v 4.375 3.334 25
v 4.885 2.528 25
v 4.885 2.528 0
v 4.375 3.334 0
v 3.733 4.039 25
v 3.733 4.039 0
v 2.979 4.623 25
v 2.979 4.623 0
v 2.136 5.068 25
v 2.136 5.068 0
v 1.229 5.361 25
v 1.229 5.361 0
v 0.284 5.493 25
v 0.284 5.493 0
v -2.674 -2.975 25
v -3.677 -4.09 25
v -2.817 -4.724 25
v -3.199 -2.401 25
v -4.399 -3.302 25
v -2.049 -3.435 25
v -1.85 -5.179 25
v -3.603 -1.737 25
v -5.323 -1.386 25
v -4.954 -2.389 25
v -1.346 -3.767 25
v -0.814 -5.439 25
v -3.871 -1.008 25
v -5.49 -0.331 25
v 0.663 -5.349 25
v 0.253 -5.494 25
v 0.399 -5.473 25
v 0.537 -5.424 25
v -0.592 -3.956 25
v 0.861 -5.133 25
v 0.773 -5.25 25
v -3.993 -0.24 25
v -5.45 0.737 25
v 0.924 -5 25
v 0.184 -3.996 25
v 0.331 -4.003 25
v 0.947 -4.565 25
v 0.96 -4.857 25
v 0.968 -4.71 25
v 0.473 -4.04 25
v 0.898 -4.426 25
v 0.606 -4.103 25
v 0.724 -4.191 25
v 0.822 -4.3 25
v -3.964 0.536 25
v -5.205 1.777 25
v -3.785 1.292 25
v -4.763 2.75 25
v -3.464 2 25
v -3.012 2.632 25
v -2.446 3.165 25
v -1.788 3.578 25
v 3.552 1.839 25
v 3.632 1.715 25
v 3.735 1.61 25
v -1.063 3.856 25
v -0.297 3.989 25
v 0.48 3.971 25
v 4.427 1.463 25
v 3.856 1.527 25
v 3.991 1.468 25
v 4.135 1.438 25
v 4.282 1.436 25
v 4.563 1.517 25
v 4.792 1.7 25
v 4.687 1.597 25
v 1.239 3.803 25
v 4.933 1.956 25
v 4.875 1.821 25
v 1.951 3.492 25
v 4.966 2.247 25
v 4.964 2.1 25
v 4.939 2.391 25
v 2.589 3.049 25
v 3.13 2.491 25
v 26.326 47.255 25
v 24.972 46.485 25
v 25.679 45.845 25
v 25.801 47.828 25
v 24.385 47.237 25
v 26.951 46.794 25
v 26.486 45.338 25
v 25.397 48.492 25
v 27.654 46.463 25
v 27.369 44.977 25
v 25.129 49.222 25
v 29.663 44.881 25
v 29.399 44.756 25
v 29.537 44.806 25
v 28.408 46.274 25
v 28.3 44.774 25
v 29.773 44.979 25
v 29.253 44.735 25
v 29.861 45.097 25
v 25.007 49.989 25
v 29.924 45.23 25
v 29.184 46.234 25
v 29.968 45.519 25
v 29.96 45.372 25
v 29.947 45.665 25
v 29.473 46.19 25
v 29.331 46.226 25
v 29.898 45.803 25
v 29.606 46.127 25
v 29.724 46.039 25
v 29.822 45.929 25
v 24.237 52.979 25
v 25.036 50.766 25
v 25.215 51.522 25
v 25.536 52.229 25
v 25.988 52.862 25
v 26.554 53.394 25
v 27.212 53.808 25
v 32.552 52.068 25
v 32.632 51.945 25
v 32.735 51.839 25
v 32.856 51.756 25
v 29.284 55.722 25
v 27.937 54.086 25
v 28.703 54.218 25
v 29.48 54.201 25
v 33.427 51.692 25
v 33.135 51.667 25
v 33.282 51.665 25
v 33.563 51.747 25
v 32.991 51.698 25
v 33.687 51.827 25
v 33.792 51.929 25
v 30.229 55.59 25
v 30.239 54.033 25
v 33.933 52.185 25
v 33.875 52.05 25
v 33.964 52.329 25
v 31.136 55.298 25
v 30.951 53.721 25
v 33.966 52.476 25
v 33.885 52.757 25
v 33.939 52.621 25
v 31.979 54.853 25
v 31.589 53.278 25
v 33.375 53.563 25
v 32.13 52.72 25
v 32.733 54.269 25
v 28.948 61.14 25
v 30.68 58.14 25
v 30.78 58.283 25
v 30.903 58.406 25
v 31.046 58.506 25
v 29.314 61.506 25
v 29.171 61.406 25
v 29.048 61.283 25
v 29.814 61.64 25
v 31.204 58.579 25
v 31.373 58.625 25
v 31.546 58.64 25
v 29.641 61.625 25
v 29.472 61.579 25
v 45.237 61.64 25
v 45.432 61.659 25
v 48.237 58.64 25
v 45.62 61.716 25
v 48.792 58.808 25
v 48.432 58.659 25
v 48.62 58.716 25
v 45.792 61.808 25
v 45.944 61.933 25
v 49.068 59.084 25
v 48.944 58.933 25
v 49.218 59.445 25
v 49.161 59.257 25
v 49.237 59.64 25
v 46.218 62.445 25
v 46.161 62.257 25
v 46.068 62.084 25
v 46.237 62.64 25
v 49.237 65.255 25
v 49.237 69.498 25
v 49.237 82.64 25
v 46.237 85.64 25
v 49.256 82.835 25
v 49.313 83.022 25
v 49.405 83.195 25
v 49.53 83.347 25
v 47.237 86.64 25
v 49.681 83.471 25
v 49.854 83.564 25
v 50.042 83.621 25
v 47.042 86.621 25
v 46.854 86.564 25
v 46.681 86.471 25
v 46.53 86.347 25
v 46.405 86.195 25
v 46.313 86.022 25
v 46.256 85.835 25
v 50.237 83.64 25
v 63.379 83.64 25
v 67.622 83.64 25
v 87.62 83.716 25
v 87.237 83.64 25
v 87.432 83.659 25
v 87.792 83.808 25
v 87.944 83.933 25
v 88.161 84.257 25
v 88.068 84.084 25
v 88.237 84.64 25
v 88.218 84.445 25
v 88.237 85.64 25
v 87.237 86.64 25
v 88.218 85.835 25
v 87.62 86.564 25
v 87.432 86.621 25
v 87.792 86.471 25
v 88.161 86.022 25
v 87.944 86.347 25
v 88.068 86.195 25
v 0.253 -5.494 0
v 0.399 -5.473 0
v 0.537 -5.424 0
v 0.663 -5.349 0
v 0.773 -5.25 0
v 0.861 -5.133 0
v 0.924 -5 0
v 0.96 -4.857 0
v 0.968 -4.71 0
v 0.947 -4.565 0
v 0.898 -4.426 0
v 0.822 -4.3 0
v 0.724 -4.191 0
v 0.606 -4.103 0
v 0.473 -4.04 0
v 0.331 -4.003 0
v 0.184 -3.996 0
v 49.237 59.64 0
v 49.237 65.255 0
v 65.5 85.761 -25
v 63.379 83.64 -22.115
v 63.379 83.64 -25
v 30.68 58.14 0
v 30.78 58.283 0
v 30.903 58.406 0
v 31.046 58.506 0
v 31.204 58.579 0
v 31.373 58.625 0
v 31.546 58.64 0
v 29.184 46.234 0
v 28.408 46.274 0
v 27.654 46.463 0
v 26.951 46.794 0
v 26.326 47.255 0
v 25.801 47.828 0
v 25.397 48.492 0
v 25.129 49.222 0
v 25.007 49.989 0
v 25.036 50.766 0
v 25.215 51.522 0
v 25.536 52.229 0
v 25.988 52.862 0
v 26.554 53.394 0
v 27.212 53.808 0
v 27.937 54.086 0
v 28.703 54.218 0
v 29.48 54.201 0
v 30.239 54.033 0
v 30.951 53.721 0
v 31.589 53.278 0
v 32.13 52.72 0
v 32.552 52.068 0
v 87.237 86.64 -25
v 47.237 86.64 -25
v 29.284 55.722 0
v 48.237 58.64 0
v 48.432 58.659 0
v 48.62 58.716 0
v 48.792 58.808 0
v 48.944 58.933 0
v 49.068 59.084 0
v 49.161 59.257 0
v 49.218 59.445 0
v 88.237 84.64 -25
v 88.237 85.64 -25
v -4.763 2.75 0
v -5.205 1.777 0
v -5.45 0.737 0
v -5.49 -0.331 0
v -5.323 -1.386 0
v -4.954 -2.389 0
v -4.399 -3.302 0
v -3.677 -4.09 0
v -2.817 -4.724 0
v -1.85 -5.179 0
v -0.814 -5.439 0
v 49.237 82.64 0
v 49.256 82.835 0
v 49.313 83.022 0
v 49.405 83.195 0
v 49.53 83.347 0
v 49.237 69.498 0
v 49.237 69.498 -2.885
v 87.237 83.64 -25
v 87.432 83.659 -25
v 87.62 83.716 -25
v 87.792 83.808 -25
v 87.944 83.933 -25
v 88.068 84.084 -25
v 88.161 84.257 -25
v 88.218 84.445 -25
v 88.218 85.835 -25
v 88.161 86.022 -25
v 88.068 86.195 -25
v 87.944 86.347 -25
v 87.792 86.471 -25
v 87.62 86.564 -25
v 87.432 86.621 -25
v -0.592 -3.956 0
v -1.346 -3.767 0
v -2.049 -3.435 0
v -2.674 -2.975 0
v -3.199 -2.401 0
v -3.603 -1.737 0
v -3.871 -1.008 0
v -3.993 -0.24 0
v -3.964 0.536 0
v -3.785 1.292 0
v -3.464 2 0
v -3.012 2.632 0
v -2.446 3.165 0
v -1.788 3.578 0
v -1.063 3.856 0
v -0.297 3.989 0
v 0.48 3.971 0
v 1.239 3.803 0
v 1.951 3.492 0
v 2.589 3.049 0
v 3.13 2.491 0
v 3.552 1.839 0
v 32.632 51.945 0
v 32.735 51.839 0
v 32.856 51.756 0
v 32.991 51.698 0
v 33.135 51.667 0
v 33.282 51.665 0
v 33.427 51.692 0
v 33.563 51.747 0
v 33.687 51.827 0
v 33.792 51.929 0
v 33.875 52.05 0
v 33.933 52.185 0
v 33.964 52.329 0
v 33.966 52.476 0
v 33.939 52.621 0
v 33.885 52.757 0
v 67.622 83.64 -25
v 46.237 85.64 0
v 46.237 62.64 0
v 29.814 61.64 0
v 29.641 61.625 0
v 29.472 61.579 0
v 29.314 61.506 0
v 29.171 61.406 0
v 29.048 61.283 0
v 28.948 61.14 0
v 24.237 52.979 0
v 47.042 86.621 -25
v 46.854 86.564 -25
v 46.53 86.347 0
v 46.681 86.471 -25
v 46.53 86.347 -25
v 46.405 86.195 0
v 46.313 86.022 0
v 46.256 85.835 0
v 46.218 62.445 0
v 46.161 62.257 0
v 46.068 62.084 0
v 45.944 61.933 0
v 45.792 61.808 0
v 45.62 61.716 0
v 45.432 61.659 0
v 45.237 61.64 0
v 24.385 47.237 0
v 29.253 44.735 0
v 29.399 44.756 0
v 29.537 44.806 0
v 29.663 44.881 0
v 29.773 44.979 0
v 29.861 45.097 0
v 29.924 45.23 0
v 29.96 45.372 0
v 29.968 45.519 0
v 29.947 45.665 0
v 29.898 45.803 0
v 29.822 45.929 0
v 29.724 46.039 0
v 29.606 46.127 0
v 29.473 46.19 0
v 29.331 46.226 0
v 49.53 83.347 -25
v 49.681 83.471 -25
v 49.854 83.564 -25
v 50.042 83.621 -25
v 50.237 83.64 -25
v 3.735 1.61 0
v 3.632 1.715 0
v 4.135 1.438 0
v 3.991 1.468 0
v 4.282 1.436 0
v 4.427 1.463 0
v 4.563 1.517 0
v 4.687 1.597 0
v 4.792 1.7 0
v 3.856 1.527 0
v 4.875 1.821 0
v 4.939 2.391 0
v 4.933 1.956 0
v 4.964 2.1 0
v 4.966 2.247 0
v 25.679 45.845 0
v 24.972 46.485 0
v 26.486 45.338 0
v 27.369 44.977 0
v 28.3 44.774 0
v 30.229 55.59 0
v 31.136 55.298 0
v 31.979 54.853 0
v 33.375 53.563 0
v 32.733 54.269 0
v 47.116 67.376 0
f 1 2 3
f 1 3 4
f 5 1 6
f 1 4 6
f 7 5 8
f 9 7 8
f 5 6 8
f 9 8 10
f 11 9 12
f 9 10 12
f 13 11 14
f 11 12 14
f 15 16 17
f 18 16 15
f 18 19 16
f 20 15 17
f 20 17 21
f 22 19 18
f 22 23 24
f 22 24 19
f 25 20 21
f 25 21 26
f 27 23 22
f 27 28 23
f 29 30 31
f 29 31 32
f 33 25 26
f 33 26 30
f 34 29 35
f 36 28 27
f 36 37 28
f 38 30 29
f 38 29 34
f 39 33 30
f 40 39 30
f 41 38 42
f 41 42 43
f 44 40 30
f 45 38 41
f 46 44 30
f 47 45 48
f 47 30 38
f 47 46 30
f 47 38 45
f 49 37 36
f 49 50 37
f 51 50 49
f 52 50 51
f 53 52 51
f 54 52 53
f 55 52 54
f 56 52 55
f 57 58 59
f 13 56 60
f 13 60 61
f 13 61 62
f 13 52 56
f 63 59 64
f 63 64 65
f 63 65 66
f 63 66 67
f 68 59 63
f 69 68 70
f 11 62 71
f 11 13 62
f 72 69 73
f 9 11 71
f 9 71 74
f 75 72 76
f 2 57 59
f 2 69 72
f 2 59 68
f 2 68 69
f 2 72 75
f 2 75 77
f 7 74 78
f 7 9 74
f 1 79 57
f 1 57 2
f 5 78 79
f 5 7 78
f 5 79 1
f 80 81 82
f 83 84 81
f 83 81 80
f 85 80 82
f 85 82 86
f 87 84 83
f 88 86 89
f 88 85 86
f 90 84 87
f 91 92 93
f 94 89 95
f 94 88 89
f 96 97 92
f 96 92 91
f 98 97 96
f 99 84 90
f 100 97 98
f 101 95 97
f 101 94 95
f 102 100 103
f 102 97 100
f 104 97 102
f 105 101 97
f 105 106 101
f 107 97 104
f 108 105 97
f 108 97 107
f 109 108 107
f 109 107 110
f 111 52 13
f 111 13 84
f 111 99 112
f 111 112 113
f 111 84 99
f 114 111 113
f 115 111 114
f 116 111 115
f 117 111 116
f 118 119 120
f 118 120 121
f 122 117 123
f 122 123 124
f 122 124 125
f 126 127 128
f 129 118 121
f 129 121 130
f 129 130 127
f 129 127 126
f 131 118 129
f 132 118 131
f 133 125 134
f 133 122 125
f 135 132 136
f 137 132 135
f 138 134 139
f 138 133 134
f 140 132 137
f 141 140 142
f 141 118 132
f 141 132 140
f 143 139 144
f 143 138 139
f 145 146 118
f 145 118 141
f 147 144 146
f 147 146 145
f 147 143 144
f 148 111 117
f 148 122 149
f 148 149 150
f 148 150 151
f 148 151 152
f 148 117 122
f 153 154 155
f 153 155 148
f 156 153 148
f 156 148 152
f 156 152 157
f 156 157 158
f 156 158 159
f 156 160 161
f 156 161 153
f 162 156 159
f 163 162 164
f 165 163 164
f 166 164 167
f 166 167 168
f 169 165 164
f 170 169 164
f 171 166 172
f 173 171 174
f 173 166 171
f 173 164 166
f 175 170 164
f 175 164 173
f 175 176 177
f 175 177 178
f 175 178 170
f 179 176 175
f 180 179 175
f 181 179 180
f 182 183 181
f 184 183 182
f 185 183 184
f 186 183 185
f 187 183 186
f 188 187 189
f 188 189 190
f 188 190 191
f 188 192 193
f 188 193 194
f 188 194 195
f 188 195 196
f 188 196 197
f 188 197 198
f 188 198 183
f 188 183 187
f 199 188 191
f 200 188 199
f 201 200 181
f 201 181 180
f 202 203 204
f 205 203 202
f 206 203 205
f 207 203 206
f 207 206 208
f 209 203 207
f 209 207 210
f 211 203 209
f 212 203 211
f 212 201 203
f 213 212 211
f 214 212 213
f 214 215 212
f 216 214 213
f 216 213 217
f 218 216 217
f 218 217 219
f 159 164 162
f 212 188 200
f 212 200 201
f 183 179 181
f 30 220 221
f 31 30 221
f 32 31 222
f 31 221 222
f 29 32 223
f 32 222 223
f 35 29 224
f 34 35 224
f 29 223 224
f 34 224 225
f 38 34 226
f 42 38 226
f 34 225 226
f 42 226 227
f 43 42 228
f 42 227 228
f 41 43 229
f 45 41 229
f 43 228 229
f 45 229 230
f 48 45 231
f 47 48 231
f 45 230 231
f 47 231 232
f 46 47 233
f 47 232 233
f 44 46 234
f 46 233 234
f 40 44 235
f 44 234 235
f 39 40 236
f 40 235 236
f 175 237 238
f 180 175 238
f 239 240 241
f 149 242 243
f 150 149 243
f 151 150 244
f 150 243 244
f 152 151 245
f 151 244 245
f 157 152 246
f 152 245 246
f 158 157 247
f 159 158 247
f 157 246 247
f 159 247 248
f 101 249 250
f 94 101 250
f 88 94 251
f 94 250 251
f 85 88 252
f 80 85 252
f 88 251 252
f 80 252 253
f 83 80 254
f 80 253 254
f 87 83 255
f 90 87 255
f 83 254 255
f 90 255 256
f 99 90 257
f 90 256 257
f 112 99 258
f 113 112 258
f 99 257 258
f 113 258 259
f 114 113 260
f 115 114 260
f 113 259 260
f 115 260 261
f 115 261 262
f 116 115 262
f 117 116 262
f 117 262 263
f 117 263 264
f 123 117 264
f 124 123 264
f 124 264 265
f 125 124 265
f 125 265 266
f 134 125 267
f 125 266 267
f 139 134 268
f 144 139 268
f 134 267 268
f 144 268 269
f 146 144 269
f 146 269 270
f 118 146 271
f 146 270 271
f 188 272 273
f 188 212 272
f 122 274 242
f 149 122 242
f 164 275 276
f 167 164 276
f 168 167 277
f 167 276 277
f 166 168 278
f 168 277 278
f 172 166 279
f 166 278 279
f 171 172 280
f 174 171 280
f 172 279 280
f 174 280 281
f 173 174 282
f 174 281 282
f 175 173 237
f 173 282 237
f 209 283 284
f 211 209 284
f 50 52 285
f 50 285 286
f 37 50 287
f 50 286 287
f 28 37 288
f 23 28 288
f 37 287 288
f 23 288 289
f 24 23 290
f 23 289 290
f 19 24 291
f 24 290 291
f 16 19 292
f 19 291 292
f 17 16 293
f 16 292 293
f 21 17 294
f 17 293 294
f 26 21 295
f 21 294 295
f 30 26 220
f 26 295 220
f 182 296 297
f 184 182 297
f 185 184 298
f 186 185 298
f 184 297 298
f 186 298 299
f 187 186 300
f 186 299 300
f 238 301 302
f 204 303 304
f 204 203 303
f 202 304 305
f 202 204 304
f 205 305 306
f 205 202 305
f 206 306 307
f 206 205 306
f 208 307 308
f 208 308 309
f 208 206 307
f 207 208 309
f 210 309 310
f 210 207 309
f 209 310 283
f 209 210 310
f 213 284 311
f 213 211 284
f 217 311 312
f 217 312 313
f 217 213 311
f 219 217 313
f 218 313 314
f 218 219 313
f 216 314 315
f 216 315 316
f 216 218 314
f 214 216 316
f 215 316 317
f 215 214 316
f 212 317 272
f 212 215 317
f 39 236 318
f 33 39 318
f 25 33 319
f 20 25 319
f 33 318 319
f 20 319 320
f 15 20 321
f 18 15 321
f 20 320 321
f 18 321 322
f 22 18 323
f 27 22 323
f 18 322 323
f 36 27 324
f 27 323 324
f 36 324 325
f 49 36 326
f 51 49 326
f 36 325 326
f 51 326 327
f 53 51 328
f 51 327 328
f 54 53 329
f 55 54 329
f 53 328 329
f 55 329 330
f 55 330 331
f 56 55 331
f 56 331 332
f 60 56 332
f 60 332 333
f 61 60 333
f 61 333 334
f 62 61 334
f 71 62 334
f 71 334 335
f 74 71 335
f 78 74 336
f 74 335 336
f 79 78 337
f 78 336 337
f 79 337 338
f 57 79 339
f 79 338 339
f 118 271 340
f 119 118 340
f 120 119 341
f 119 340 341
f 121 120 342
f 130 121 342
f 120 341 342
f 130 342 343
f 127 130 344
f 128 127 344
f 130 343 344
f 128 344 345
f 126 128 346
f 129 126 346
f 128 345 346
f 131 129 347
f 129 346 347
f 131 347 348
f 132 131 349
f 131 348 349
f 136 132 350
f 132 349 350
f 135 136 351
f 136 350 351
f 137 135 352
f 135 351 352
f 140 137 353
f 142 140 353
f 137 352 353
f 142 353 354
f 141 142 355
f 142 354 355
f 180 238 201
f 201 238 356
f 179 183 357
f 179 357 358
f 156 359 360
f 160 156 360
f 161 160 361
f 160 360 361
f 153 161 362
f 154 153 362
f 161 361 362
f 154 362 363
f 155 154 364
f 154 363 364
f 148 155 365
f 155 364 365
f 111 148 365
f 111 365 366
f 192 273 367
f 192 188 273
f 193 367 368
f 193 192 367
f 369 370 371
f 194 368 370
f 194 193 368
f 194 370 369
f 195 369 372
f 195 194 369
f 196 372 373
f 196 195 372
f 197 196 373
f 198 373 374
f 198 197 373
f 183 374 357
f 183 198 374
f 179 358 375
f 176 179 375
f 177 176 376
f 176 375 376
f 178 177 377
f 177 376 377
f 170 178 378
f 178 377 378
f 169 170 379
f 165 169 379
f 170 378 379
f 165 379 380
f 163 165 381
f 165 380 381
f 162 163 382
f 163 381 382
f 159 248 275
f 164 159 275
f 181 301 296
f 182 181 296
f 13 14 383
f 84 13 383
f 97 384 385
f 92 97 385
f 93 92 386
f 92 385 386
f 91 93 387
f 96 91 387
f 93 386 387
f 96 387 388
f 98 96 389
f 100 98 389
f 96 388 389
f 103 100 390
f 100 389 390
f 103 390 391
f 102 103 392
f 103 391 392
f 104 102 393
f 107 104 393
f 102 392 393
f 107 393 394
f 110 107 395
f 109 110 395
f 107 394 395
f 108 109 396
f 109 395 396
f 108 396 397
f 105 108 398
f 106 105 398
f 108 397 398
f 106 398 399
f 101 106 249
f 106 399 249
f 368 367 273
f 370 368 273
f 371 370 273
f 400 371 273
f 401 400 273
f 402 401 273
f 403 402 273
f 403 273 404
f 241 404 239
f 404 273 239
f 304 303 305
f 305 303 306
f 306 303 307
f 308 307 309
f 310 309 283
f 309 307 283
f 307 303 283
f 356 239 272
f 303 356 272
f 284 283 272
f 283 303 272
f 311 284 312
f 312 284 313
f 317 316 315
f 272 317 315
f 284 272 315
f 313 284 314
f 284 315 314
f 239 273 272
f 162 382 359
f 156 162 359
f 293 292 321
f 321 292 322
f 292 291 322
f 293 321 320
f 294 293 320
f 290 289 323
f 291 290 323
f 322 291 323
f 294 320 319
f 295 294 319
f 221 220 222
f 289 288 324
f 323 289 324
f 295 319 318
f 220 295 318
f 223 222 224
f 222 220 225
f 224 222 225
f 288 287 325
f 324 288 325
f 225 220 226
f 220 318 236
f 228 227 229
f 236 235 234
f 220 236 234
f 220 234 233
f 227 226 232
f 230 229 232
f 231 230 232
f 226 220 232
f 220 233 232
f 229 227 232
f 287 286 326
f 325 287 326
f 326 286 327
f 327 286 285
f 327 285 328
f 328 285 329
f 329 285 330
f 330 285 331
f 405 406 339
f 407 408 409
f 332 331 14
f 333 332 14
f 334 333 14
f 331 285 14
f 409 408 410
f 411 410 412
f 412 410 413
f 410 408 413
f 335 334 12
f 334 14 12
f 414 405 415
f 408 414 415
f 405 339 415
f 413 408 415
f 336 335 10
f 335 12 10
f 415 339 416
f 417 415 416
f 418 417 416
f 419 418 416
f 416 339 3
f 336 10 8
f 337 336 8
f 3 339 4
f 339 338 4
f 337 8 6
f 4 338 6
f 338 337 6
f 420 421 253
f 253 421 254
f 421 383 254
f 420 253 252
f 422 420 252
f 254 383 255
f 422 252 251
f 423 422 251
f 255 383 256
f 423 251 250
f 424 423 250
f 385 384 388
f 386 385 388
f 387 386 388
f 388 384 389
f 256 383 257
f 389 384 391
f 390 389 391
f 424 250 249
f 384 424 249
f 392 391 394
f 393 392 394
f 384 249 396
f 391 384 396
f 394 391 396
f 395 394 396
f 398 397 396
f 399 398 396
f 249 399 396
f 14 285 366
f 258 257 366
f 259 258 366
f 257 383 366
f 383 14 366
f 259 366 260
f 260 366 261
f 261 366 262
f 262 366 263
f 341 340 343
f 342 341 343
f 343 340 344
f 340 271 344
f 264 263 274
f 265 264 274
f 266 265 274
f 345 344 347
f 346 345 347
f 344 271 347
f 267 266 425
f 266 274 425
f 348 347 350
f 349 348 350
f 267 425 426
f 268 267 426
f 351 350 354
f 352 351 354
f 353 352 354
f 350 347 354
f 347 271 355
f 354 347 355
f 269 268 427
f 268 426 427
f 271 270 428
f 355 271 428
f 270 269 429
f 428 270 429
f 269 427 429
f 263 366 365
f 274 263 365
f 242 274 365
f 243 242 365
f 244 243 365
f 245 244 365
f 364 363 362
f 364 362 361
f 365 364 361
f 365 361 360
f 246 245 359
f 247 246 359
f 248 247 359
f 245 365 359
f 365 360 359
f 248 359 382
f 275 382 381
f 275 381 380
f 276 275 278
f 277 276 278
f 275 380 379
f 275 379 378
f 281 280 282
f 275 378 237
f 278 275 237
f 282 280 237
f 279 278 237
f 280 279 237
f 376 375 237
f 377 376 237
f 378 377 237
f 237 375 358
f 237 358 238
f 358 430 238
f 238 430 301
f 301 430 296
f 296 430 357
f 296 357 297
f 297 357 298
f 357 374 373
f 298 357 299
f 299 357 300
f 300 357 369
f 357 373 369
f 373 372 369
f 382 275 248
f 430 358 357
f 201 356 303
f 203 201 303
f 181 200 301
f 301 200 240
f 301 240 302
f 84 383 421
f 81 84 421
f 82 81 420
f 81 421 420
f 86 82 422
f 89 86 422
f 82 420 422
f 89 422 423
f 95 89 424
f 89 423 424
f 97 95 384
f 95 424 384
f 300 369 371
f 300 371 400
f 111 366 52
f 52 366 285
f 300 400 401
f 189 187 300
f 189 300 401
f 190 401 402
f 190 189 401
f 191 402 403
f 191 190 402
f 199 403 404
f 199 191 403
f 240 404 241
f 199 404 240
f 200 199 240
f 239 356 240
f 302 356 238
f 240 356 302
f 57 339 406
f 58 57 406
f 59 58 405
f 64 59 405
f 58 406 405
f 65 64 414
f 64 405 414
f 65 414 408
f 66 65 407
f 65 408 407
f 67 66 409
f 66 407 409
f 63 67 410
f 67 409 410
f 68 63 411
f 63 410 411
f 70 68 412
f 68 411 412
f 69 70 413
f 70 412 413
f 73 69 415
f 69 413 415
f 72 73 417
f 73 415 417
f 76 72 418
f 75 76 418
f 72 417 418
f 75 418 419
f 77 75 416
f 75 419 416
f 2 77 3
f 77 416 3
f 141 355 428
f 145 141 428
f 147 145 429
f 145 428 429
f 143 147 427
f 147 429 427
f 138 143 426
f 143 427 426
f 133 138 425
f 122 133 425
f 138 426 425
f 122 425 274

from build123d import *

# Parameters (mm, degrees)
F1_DEPTH = 25
F2_DEPTH = 25
F4_DEPTH = 3


with BuildPart() as f1:
    # F0 (on Top) → F1 (new body)
    with BuildSketch(Plane.XY):
        with BuildLine():
            ThreePointArc((0.2530346427, -5.4941763231), (0.9677357809, -4.7104657369), (0.1840251947, -3.9957645986))
            ThreePointArc((0.1840251947, -3.9957645986), (-3.4641016151, 2), (3.5524462473, 1.8385118058))
            ThreePointArc((3.5524462473, 1.8385118058), (4.5632508823, 1.517149098), (4.88461359, 2.527953733))
            ThreePointArc((4.88461359, 2.527953733), (2.9794438001, 4.6230849702), (0.2844262333, 5.4926406871))
            ThreePointArc((0.2844262333, 5.4926406871), (-2.6258785407, 4.8326764727), (-4.7631397208, 2.75))
            ThreePointArc((-4.7631397208, 2.75), (-4.6986032782, -2.8588681736), (0.2530346427, -5.4941763231))
        make_face()
        with BuildLine():
            Line((24.2368602792, 52.9794734195), (-4.7631397208, 2.75))
            ThreePointArc((-4.7631397208, 2.75), (-2.6258785407, 4.8326764727), (0.2844262333, 5.4926406871))
            Line((0.2844262333, 5.4926406871), (24.3854467478, 47.2368327324))
            ThreePointArc((24.3854467478, 47.2368327324), (23.501840136, 50.0872127066), (24.2368602792, 52.9794734195))
        make_face()
        with BuildLine():
            ThreePointArc((29.2844262333, 55.7221141066), (26.3741214593, 55.0621498922), (24.2368602792, 52.9794734195))
            ThreePointArc((24.2368602792, 52.9794734195), (23.501840136, 50.0872127066), (24.3854467478, 47.2368327324))
            ThreePointArc((24.3854467478, 47.2368327324), (26.486012872, 45.3376569144), (29.2530346427, 44.7352970964))
            ThreePointArc((29.2530346427, 44.7352970964), (29.9677357809, 45.5190076826), (29.1840251947, 46.2337088209))
            ThreePointArc((29.1840251947, 46.2337088209), (25.5358983849, 52.2294734195), (32.5524462473, 52.0679852253))
            ThreePointArc((32.5524462473, 52.0679852253), (33.5632508823, 51.7466225175), (33.88461359, 52.7574271525))
            ThreePointArc((33.88461359, 52.7574271525), (31.9794438001, 54.8525583897), (29.2844262333, 55.7221141066))
        make_face()
        with BuildLine():
            Line((28.9481851446, 61.1397274573), (24.2368602792, 52.9794734195))
            ThreePointArc((24.2368602792, 52.9794734195), (26.3741214593, 55.0621498922), (29.2844262333, 55.7221141066))
            Line((29.2844262333, 55.7221141066), (30.6802359522, 58.1397274573))
            ThreePointArc((30.6802359522, 58.1397274573), (31.0462613559, 58.5057528611), (31.5462613559, 58.6397274573))
            Line((31.5462613559, 58.6397274573), (48.2368602792, 58.6397274573))
            ThreePointArc((48.2368602792, 58.6397274573), (48.9439670604, 58.9326206762), (49.2368602792, 59.6397274573))
            Line((49.2368602792, 59.6397274573), (49.2368602792, 61.6397274573))
            Line((49.2368602792, 61.6397274573), (49.2368602792, 65.2549511465))
            Line((49.2368602792, 65.2549511465), (49.2368602792, 69.4975918336))
            Line((49.2368602792, 69.4975918336), (49.2368602792, 82.6397274573))
            ThreePointArc((49.2368602792, 82.6397274573), (49.3129807467, 83.0224108897), (49.529753498, 83.3468342385))
            Line((49.529753498, 83.3468342385), (46.529753498, 86.3468342385))
            ThreePointArc((46.529753498, 86.3468342385), (46.3129807467, 86.0224108897), (46.2368602792, 85.6397274573))
            Line((46.2368602792, 85.6397274573), (46.2368602792, 62.6397274573))
            ThreePointArc((46.2368602792, 62.6397274573), (45.9439670604, 61.9326206762), (45.2368602792, 61.6397274573))
            Line((45.2368602792, 61.6397274573), (29.8142105484, 61.6397274573))
            ThreePointArc((29.8142105484, 61.6397274573), (29.3142105484, 61.5057528611), (28.9481851446, 61.1397274573))
        make_face()
        Polygon((49.2368602792, 69.4975918336), (49.2368602792, 65.2549511465), (67.62163659, 83.6397274573), (63.3789959029, 83.6397274573), align=None)
        with BuildLine():
            ThreePointArc((47.2368602792, 86.6397274573), (46.8541768468, 86.5636069899), (46.529753498, 86.3468342385))
            Line((46.529753498, 86.3468342385), (49.529753498, 83.3468342385))
            ThreePointArc((49.529753498, 83.3468342385), (49.8541768468, 83.5636069899), (50.2368602792, 83.6397274573))
            Line((50.2368602792, 83.6397274573), (63.3789959029, 83.6397274573))
            Line((63.3789959029, 83.6397274573), (67.62163659, 83.6397274573))
            Line((67.62163659, 83.6397274573), (87.2368602792, 83.6397274573))
            ThreePointArc((87.2368602792, 83.6397274573), (87.9439670604, 83.9326206762), (88.2368602792, 84.6397274573))
            Line((88.2368602792, 84.6397274573), (88.2368602792, 85.6397274573))
            ThreePointArc((88.2368602792, 85.6397274573), (87.9439670604, 86.3468342385), (87.2368602792, 86.6397274573))
            Line((87.2368602792, 86.6397274573), (47.2368602792, 86.6397274573))
        make_face()
    extrude(amount=F1_DEPTH)

    # F0 (on Top) → F2 (join)
    with BuildSketch(Plane.XY):
        with BuildLine():
            ThreePointArc((47.2368602792, 86.6397274573), (46.8541768468, 86.5636069899), (46.529753498, 86.3468342385))
            Line((46.529753498, 86.3468342385), (49.529753498, 83.3468342385))
            ThreePointArc((49.529753498, 83.3468342385), (49.8541768468, 83.5636069899), (50.2368602792, 83.6397274573))
            Line((50.2368602792, 83.6397274573), (63.3789959029, 83.6397274573))
            Line((63.3789959029, 83.6397274573), (67.62163659, 83.6397274573))
            Line((67.62163659, 83.6397274573), (87.2368602792, 83.6397274573))
            ThreePointArc((87.2368602792, 83.6397274573), (87.9439670604, 83.9326206762), (88.2368602792, 84.6397274573))
            Line((88.2368602792, 84.6397274573), (88.2368602792, 85.6397274573))
            ThreePointArc((88.2368602792, 85.6397274573), (87.9439670604, 86.3468342385), (87.2368602792, 86.6397274573))
            Line((87.2368602792, 86.6397274573), (47.2368602792, 86.6397274573))
        make_face()
        Polygon((49.2368602792, 69.4975918336), (49.2368602792, 65.2549511465), (67.62163659, 83.6397274573), (63.3789959029, 83.6397274573), align=None)
    extrude(amount=-F2_DEPTH)

    # F3 (on face) → F4 (cut, through all)
    with BuildSketch(Plane(origin=(-8.0090454337, 8.0090454337, 0), x_dir=(0.7071067812, 0.7071067812, 0), z_dir=(0.7071067812, -0.7071067812, 0))):
        Polygon((106.9579362494, -25), (80.9579362494, 0), (80.9579362494, -25), align=None)
    extrude(amount=-F4_DEPTH, mode=Mode.SUBTRACT)


solid = f1.part
